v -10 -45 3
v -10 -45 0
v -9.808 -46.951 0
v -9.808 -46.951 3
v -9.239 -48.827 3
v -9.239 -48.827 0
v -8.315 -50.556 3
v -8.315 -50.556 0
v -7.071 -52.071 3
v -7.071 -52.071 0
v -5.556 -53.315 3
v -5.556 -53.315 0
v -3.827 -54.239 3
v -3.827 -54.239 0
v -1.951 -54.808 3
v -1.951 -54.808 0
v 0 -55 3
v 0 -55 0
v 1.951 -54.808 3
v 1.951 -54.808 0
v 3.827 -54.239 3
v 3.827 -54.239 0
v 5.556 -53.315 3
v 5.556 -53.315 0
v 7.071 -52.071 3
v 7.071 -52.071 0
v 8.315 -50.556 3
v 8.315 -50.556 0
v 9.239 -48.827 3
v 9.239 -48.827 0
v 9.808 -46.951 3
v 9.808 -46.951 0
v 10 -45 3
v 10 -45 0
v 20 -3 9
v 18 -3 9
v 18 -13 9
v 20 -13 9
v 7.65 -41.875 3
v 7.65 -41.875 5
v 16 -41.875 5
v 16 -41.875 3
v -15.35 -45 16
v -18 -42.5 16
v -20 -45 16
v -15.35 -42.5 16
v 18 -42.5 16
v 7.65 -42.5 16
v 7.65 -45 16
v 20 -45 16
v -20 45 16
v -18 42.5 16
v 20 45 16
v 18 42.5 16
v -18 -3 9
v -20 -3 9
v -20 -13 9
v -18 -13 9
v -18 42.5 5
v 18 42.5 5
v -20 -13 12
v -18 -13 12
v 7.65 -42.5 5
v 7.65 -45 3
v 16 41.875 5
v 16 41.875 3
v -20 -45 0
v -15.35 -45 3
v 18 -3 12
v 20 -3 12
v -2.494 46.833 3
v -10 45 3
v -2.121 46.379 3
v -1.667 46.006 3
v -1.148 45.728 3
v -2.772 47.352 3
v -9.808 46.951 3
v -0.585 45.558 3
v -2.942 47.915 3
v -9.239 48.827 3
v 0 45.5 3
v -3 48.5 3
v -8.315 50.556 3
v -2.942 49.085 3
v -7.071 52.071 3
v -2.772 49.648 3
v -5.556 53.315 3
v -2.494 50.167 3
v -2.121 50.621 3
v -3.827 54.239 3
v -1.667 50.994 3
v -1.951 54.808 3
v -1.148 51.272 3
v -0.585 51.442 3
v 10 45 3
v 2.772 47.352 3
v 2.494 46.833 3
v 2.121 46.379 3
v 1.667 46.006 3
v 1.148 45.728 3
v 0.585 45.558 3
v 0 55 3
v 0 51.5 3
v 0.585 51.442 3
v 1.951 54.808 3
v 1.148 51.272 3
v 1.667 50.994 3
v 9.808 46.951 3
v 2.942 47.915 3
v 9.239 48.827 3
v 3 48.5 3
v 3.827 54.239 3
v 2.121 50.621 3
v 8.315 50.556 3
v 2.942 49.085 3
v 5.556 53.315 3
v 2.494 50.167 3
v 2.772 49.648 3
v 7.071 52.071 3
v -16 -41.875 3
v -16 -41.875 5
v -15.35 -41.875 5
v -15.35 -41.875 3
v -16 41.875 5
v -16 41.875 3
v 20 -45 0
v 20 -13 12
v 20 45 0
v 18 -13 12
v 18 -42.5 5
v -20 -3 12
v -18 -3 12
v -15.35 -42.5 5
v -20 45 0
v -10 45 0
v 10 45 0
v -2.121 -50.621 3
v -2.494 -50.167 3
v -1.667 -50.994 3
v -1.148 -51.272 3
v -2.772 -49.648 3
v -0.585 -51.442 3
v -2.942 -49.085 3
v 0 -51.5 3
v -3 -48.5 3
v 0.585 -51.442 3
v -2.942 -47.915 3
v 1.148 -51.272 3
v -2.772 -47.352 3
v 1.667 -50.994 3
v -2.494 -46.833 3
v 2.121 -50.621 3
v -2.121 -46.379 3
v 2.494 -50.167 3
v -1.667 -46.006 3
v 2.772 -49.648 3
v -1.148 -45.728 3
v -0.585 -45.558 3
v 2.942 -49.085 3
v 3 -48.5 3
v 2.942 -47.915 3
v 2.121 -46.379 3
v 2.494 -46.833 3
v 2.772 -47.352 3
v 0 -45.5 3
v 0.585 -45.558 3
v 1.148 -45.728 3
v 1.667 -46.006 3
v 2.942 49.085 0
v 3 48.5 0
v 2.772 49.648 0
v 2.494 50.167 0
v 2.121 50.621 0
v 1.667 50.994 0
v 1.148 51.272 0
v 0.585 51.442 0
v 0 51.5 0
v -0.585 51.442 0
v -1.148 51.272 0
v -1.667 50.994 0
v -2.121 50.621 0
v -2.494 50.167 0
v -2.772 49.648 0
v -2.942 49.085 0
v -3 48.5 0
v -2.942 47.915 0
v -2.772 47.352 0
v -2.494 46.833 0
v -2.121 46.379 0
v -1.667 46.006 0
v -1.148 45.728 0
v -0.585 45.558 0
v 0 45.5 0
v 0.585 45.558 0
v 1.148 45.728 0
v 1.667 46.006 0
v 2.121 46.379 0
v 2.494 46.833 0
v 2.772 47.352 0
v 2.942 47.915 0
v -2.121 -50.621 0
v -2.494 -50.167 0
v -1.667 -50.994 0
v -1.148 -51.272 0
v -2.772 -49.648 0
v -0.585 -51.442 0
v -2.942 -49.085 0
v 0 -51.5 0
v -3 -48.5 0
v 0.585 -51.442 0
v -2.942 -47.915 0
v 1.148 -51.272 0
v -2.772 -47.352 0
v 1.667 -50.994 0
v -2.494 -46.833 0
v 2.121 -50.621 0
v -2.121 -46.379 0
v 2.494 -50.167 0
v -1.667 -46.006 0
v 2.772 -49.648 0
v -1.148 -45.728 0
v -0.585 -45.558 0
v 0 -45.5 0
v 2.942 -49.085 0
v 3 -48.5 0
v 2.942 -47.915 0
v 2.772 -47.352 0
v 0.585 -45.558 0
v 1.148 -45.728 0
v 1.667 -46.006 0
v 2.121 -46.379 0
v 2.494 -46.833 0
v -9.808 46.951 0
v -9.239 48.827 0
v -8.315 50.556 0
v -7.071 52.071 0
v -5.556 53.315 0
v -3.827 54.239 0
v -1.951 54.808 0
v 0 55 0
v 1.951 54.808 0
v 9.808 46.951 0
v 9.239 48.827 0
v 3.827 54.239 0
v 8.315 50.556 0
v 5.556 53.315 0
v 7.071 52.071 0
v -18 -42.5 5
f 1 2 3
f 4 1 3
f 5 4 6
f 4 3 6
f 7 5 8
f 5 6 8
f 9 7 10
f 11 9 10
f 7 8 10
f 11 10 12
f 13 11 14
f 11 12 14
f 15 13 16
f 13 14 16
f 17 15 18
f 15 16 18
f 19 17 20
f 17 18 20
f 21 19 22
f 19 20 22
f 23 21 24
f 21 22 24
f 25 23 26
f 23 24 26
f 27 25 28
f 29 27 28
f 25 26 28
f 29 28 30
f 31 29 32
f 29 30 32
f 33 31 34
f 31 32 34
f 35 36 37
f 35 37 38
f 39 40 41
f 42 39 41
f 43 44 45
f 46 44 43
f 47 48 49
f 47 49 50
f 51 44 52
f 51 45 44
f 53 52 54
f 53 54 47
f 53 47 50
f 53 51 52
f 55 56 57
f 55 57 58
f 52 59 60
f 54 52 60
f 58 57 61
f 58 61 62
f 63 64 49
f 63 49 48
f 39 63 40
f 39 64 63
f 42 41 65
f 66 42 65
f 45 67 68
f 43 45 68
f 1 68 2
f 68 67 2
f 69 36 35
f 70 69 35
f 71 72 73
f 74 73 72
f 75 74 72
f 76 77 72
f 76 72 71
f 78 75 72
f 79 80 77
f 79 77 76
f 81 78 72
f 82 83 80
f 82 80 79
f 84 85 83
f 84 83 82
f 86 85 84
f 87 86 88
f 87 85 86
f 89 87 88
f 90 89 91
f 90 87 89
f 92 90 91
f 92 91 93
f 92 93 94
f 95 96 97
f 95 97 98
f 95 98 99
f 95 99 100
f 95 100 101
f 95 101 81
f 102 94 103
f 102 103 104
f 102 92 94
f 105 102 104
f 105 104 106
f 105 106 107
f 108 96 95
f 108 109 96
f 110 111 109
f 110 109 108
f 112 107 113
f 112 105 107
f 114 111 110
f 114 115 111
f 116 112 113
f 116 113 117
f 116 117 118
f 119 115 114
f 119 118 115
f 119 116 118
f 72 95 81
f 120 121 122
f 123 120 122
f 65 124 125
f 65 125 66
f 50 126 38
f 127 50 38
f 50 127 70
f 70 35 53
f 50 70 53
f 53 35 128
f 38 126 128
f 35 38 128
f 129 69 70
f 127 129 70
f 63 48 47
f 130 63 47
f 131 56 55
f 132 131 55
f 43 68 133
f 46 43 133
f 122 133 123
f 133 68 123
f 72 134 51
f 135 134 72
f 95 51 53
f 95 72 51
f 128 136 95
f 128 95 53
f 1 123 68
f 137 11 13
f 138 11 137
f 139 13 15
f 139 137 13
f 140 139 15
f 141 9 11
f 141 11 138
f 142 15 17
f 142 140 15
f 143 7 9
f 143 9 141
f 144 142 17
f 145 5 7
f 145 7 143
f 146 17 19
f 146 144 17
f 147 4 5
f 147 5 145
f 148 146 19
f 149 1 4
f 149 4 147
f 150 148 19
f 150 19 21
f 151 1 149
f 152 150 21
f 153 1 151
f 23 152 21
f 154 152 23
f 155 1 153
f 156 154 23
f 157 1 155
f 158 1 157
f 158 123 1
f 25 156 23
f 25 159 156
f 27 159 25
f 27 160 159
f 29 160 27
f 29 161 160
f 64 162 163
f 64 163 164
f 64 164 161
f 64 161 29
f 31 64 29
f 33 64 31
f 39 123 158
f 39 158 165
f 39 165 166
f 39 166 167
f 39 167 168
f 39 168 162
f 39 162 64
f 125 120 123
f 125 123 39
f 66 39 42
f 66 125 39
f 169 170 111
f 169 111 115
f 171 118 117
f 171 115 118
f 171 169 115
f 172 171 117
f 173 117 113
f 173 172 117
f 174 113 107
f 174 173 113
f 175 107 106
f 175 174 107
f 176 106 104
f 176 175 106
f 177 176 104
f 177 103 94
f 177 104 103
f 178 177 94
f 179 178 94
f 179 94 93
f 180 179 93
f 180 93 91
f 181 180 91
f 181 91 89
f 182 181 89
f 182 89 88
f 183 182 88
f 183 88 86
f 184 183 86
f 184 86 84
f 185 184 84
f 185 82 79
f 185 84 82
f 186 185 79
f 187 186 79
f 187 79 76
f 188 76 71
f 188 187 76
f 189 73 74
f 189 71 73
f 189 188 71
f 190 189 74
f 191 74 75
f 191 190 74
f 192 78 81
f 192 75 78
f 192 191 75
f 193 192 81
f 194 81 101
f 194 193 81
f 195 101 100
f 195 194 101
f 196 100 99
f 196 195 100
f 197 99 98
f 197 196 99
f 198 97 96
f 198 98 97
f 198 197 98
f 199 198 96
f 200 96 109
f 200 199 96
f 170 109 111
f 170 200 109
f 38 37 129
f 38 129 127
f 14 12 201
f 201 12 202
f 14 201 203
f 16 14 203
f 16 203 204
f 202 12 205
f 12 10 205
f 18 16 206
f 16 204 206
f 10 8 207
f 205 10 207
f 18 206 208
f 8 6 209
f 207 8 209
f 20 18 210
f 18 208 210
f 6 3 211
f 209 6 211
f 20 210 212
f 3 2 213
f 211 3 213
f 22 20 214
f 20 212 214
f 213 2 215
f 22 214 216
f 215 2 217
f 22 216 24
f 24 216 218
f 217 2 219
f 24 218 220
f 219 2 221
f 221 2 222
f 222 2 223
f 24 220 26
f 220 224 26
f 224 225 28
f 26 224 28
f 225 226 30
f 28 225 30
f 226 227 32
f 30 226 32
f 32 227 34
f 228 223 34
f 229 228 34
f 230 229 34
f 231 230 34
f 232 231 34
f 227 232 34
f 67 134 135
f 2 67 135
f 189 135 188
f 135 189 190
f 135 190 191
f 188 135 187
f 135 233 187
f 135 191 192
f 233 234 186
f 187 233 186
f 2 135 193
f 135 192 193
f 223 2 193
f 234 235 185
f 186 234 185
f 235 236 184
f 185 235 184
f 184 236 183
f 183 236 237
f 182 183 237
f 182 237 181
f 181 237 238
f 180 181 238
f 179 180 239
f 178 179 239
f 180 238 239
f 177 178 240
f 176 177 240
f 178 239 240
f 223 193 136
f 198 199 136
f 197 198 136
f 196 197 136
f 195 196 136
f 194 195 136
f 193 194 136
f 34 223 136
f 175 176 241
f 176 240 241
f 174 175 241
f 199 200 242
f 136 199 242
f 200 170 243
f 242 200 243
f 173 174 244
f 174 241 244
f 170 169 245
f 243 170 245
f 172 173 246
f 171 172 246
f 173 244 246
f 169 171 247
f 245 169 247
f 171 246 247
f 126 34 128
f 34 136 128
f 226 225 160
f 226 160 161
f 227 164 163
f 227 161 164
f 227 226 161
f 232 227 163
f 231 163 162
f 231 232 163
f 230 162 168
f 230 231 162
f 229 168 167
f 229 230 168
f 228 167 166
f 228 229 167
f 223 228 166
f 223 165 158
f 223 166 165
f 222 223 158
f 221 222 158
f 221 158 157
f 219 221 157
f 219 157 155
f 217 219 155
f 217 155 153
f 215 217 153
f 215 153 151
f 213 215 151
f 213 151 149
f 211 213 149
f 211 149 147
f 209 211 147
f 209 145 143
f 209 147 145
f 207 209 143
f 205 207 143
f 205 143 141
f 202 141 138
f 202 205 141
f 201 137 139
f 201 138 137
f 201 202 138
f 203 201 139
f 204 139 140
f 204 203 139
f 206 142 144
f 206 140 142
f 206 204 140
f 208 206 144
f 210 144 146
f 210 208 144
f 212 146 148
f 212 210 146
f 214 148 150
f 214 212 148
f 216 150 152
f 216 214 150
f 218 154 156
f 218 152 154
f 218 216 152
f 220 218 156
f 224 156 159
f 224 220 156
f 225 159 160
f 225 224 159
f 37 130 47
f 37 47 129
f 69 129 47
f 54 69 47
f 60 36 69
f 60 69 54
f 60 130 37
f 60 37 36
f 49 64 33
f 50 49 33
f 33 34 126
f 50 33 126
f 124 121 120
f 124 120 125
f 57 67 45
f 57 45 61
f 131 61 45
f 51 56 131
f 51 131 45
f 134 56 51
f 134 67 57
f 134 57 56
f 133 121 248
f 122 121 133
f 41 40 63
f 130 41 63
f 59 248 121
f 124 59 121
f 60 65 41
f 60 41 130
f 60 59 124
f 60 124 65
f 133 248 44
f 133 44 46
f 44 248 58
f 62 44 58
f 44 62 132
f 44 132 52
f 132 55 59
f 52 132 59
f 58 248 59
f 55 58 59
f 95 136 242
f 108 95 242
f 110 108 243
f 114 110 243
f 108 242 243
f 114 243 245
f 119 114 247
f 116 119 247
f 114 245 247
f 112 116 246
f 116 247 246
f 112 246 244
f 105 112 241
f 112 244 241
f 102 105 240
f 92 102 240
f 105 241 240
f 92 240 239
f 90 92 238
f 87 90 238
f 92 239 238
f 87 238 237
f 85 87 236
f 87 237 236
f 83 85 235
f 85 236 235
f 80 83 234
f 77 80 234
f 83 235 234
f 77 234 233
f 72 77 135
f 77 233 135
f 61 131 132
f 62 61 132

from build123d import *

# Parameters (mm, degrees)
BOX002_W          = 50
BOX002_H          = 10
BOX002_DEPTH      = 3
CYLINDER001_R     = 3
CYLINDER001_DEPTH = 5
CYLINDER_R        = 10
CYLINDER_DEPTH    = 3
CYLINDER003_R     = 3
CYLINDER003_DEPTH = 5
CYLINDER002_R     = 10
CYLINDER002_DEPTH = 3
BOX001_W          = 36
BOX001_H          = 85
BOX001_DEPTH      = 15
BOX_W             = 23
BOX_H             = 15
BOX_DEPTH         = 13
SKETCH_W          = 40
SKETCH_H          = 90
PAD_DEPTH         = 16
SKETCH001_W       = 32
SKETCH001_H       = 83.75
POCKET_DEPTH      = 13


with BuildPart() as cube002:
    # Box002 → Box002 (new body)
    with BuildSketch(Plane(origin=(-25, -13, 9), x_dir=(1, 0, 0), z_dir=(0, 0, 1))):
        with Locations((25, 5)):
            Rectangle(BOX002_W, BOX002_H)
    extrude(amount=BOX002_DEPTH)


with BuildPart() as cylinder001:
    # Cylinder001 → Cylinder001 (new body)
    with BuildSketch(Plane(origin=(0, -48.5, -1), x_dir=(1, 0, 0), z_dir=(0, 0, 1))):
        Circle(CYLINDER001_R)
    extrude(amount=CYLINDER001_DEPTH)


with BuildPart() as also_ful:
    # Cylinder → Cylinder (new body)
    with BuildSketch(Plane(origin=(0, -45, 0), x_dir=(1, 0, 0), z_dir=(0, 0, 1))):
        Circle(CYLINDER_R)
    extrude(amount=CYLINDER_DEPTH)

    # Cut002: cut Cylinder001
    add(cylinder001.part, mode=Mode.SUBTRACT)


with BuildPart() as cylinder003:
    # Cylinder003 → Cylinder003 (new body)
    with BuildSketch(Plane(origin=(0, 48.5, -1), x_dir=(1, 0, 0), z_dir=(0, 0, 1))):
        Circle(CYLINDER003_R)
    extrude(amount=CYLINDER003_DEPTH)


with BuildPart() as felso_ful:
    # Cylinder002 → Cylinder002 (new body)
    with BuildSketch(Plane(origin=(0, 45, 0), x_dir=(1, 0, 0), z_dir=(0, 0, 1))):
        Circle(CYLINDER002_R)
    extrude(amount=CYLINDER002_DEPTH)

    # Cut003: cut Cylinder003
    add(cylinder003.part, mode=Mode.SUBTRACT)


with BuildPart() as cube001:
    # Box001 → Box001 (new body)
    with BuildSketch(Plane(origin=(-18, -42.5, 5), x_dir=(1, 0, 0), z_dir=(0, 0, 1))):
        with Locations((18, 42.5)):
            Rectangle(BOX001_W, BOX001_H)
    extrude(amount=BOX001_DEPTH)


with BuildPart() as cube:
    # Box → Box (new body)
    with BuildSketch(Plane(origin=(-15.35, -49.3, 3), x_dir=(1, 0, 0), z_dir=(0, 0, 1))):
        with Locations((11.5, 7.5)):
            Rectangle(BOX_W, BOX_H)
    extrude(amount=BOX_DEPTH)


with BuildPart() as also:
    # Sketch → Pad (new body)
    with BuildSketch(Plane.XY):
        Rectangle(SKETCH_W, SKETCH_H)
    extrude(amount=PAD_DEPTH)

    # Sketch001 (on Face6 of Pad) → Pocket (cut)
    with BuildSketch(Plane.XY.offset(16)):
        Rectangle(SKETCH001_W, SKETCH001_H)
    extrude(amount=-POCKET_DEPTH, mode=Mode.SUBTRACT)

    # Cut: cut Cube
    add(cube.part, mode=Mode.SUBTRACT)

    # Cut001: cut Cube001
    add(cube001.part, mode=Mode.SUBTRACT)

    # Fusion: union also ful, felso ful
    add(also_ful.part)
    add(felso_ful.part)

    # Cut004: cut Cube002
    add(cube002.part, mode=Mode.SUBTRACT)


solid = also.part
